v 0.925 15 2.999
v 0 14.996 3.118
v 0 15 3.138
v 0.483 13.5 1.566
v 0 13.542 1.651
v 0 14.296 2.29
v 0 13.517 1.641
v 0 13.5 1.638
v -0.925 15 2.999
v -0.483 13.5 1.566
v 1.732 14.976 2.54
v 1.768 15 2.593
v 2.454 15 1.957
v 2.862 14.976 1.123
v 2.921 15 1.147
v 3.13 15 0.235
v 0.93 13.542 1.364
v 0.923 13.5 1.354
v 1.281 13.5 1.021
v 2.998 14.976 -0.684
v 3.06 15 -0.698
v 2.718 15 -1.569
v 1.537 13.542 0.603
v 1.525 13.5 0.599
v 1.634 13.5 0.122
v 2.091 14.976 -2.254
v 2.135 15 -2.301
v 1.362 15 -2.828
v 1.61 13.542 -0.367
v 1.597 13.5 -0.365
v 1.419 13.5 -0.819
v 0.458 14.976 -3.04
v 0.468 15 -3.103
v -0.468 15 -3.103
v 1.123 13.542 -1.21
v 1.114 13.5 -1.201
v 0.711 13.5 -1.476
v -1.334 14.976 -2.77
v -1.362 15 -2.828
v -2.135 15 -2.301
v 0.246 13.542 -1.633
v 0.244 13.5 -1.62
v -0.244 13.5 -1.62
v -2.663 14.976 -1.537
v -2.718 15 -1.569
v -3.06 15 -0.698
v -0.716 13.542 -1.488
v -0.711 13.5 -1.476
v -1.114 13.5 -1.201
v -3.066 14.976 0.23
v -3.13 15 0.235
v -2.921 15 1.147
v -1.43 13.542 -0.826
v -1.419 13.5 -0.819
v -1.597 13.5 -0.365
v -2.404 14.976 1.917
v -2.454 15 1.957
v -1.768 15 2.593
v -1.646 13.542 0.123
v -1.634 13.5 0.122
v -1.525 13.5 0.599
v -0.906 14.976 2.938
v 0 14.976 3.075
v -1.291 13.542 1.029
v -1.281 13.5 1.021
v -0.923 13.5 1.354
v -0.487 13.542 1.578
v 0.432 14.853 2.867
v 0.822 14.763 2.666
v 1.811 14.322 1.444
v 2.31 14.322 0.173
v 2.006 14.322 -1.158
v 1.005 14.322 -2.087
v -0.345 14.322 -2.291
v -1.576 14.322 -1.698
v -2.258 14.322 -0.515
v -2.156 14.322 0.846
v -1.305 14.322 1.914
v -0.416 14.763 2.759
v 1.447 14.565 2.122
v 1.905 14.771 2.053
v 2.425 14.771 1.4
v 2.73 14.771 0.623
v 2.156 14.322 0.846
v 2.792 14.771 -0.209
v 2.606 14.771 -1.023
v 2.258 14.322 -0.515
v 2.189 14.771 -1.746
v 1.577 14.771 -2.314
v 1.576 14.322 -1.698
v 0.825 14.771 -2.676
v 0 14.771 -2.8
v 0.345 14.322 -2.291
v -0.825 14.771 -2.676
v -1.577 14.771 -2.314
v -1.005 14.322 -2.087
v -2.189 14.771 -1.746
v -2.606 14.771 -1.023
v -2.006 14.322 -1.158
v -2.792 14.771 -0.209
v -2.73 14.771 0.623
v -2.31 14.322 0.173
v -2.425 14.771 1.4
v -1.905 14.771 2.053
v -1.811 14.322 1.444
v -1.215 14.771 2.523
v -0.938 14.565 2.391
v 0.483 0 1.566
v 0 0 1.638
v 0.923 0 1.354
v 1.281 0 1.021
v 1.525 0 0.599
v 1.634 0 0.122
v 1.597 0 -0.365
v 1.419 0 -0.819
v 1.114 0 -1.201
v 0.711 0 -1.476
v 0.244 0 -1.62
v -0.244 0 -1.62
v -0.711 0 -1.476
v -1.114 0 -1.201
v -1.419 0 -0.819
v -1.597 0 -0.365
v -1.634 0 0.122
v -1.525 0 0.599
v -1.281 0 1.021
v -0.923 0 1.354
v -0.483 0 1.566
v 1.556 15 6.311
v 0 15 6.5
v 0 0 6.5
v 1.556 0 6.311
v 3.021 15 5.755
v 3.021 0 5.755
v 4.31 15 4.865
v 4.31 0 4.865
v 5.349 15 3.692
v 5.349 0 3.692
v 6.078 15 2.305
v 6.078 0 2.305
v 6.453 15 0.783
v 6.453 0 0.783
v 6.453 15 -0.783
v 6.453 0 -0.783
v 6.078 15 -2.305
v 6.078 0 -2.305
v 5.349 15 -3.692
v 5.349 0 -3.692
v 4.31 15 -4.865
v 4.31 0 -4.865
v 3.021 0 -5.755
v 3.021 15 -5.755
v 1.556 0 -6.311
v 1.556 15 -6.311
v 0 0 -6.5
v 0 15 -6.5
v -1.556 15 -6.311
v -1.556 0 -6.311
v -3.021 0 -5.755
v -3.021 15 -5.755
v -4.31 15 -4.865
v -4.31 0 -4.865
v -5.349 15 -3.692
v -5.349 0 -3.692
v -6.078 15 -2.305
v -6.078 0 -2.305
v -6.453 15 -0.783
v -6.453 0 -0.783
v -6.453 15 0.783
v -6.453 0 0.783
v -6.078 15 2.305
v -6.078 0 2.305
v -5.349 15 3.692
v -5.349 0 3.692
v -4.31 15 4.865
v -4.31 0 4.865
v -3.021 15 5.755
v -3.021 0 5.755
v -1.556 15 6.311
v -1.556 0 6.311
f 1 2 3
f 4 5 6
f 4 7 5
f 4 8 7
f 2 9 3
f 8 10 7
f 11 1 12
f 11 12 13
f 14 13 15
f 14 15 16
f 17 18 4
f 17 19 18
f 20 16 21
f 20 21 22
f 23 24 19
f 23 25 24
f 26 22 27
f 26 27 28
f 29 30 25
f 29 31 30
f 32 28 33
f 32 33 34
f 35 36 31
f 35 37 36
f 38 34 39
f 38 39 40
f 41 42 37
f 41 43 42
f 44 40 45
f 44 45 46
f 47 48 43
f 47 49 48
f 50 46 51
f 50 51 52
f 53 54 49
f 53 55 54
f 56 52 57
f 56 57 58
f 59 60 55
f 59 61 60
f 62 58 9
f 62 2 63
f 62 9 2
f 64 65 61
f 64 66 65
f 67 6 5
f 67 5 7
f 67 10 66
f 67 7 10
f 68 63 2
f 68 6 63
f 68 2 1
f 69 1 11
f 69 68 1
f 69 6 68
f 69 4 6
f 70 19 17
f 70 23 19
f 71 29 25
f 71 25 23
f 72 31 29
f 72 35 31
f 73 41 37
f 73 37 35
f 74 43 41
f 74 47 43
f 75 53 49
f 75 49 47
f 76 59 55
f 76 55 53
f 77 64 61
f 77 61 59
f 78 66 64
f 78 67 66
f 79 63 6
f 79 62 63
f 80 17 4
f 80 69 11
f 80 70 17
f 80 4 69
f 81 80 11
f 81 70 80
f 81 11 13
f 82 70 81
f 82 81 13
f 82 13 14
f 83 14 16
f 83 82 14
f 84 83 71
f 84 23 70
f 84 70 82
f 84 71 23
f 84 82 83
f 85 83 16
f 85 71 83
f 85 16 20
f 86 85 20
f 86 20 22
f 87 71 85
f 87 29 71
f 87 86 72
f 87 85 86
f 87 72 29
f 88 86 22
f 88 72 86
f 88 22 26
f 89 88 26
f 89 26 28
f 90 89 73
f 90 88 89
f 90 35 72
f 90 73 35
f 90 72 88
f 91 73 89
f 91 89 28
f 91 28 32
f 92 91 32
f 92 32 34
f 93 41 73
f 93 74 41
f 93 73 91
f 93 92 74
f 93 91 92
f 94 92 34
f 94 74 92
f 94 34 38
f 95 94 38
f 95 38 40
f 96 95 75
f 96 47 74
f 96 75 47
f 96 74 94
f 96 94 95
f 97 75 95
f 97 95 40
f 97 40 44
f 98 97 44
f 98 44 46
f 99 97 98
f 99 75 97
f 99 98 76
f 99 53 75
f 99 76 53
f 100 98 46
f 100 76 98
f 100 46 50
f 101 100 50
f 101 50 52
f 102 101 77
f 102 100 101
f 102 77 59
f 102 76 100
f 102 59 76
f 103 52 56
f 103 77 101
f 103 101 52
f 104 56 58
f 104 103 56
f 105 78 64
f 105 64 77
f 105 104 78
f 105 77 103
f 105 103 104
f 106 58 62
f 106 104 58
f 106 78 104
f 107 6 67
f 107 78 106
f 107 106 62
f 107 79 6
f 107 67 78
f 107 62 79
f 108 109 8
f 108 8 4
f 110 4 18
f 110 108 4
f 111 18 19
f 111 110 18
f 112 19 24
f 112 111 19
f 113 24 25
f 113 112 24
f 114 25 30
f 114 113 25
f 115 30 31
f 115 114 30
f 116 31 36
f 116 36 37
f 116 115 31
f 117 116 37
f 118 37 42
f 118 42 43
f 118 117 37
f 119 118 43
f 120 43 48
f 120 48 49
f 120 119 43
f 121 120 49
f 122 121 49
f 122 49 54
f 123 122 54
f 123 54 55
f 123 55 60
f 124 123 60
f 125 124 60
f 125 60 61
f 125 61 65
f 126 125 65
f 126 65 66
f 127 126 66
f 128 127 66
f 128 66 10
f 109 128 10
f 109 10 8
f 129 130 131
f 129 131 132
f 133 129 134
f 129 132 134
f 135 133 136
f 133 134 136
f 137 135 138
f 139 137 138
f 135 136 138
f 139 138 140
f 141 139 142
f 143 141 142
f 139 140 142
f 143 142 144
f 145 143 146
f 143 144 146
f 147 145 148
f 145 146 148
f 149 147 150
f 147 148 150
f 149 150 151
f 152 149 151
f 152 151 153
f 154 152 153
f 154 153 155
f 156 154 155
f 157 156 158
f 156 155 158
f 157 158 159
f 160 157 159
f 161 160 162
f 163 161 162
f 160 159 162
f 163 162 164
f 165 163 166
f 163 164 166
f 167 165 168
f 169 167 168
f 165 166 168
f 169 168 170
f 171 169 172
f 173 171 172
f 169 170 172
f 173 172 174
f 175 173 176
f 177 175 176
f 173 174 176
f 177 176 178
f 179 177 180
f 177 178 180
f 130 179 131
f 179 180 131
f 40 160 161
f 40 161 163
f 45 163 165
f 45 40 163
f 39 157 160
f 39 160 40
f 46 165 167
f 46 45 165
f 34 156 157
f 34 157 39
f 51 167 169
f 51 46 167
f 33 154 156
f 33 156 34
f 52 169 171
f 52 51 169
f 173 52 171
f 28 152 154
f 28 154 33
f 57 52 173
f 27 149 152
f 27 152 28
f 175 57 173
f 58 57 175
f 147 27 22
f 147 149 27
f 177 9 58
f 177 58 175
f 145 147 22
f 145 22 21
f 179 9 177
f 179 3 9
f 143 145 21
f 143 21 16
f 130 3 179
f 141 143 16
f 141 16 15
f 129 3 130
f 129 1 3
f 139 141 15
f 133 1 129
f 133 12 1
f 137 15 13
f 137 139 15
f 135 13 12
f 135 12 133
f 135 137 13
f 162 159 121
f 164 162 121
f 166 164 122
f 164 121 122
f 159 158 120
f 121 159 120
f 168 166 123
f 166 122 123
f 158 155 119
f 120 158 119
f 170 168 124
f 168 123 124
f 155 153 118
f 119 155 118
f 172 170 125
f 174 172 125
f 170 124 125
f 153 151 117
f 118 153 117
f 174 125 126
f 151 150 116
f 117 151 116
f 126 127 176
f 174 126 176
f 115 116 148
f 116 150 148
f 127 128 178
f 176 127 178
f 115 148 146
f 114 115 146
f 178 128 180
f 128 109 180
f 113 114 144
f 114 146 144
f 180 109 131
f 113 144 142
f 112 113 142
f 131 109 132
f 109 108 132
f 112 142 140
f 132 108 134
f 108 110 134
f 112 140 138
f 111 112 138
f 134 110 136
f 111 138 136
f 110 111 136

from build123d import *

# Parameters (mm, degrees)
SKETCH1_R               = 6.5
BOSS_EXTRUDE1_DEPTH     = 15
CUT_EXTRUDE1_DEPTH      = 18.592612086
CUT_EXTRUDE1_DEPTH_BACK = 18.592612086
SKETCH2_R               = 1.6383
FILLET1_SIZE            = 1.5


with BuildPart() as part:
    # Sketch1 → Boss-Extrude1 (new body)
    with BuildSketch(Plane(origin=(0, 0, 0), x_dir=(1, 0, 0), z_dir=(0, 1, 0))):
        with Locations(Location((0, 0, 0), (0, 0, 270))):
            Circle(SKETCH1_R)
    extrude(amount=BOSS_EXTRUDE1_DEPTH)

    # Sketch2 → Cut-Extrude1 (cut, two sides: drawn at the far end of the back side and taken through both)
    with BuildSketch(Plane(origin=(0, 15, 0), x_dir=(1, 0, 0), z_dir=(0, 1, 0)).offset(-CUT_EXTRUDE1_DEPTH_BACK)):
        with Locations(Location((0, 0, 0), (0, 0, 270))):
            Circle(SKETCH2_R)
    extrude(amount=CUT_EXTRUDE1_DEPTH + CUT_EXTRUDE1_DEPTH_BACK, mode=Mode.SUBTRACT)

    # Fillet1
    # a fillet whose section is not a circle: 1.5 mm, written as the material it takes off along each edge
    with BuildSketch(Plane(origin=(0, 15, 0), x_dir=(0, 0, 1), z_dir=(-1, 0, 0))) as fillet1_piece_1:
        with BuildLine():
            Bezier((1.6383 + FILLET1_SIZE, 0), (1.6383, 0), (1.6383, -FILLET1_SIZE), weights=[1, 0.106066017, 1])
            Line((1.6383, -FILLET1_SIZE), (1.6383, 0))
            Line((1.6383, 0), (1.6383 + FILLET1_SIZE, 0))
        make_face()
    revolve(axis=Axis((0, 15, 0), (0, 1, 0)), mode=Mode.SUBTRACT)


solid = part.part
